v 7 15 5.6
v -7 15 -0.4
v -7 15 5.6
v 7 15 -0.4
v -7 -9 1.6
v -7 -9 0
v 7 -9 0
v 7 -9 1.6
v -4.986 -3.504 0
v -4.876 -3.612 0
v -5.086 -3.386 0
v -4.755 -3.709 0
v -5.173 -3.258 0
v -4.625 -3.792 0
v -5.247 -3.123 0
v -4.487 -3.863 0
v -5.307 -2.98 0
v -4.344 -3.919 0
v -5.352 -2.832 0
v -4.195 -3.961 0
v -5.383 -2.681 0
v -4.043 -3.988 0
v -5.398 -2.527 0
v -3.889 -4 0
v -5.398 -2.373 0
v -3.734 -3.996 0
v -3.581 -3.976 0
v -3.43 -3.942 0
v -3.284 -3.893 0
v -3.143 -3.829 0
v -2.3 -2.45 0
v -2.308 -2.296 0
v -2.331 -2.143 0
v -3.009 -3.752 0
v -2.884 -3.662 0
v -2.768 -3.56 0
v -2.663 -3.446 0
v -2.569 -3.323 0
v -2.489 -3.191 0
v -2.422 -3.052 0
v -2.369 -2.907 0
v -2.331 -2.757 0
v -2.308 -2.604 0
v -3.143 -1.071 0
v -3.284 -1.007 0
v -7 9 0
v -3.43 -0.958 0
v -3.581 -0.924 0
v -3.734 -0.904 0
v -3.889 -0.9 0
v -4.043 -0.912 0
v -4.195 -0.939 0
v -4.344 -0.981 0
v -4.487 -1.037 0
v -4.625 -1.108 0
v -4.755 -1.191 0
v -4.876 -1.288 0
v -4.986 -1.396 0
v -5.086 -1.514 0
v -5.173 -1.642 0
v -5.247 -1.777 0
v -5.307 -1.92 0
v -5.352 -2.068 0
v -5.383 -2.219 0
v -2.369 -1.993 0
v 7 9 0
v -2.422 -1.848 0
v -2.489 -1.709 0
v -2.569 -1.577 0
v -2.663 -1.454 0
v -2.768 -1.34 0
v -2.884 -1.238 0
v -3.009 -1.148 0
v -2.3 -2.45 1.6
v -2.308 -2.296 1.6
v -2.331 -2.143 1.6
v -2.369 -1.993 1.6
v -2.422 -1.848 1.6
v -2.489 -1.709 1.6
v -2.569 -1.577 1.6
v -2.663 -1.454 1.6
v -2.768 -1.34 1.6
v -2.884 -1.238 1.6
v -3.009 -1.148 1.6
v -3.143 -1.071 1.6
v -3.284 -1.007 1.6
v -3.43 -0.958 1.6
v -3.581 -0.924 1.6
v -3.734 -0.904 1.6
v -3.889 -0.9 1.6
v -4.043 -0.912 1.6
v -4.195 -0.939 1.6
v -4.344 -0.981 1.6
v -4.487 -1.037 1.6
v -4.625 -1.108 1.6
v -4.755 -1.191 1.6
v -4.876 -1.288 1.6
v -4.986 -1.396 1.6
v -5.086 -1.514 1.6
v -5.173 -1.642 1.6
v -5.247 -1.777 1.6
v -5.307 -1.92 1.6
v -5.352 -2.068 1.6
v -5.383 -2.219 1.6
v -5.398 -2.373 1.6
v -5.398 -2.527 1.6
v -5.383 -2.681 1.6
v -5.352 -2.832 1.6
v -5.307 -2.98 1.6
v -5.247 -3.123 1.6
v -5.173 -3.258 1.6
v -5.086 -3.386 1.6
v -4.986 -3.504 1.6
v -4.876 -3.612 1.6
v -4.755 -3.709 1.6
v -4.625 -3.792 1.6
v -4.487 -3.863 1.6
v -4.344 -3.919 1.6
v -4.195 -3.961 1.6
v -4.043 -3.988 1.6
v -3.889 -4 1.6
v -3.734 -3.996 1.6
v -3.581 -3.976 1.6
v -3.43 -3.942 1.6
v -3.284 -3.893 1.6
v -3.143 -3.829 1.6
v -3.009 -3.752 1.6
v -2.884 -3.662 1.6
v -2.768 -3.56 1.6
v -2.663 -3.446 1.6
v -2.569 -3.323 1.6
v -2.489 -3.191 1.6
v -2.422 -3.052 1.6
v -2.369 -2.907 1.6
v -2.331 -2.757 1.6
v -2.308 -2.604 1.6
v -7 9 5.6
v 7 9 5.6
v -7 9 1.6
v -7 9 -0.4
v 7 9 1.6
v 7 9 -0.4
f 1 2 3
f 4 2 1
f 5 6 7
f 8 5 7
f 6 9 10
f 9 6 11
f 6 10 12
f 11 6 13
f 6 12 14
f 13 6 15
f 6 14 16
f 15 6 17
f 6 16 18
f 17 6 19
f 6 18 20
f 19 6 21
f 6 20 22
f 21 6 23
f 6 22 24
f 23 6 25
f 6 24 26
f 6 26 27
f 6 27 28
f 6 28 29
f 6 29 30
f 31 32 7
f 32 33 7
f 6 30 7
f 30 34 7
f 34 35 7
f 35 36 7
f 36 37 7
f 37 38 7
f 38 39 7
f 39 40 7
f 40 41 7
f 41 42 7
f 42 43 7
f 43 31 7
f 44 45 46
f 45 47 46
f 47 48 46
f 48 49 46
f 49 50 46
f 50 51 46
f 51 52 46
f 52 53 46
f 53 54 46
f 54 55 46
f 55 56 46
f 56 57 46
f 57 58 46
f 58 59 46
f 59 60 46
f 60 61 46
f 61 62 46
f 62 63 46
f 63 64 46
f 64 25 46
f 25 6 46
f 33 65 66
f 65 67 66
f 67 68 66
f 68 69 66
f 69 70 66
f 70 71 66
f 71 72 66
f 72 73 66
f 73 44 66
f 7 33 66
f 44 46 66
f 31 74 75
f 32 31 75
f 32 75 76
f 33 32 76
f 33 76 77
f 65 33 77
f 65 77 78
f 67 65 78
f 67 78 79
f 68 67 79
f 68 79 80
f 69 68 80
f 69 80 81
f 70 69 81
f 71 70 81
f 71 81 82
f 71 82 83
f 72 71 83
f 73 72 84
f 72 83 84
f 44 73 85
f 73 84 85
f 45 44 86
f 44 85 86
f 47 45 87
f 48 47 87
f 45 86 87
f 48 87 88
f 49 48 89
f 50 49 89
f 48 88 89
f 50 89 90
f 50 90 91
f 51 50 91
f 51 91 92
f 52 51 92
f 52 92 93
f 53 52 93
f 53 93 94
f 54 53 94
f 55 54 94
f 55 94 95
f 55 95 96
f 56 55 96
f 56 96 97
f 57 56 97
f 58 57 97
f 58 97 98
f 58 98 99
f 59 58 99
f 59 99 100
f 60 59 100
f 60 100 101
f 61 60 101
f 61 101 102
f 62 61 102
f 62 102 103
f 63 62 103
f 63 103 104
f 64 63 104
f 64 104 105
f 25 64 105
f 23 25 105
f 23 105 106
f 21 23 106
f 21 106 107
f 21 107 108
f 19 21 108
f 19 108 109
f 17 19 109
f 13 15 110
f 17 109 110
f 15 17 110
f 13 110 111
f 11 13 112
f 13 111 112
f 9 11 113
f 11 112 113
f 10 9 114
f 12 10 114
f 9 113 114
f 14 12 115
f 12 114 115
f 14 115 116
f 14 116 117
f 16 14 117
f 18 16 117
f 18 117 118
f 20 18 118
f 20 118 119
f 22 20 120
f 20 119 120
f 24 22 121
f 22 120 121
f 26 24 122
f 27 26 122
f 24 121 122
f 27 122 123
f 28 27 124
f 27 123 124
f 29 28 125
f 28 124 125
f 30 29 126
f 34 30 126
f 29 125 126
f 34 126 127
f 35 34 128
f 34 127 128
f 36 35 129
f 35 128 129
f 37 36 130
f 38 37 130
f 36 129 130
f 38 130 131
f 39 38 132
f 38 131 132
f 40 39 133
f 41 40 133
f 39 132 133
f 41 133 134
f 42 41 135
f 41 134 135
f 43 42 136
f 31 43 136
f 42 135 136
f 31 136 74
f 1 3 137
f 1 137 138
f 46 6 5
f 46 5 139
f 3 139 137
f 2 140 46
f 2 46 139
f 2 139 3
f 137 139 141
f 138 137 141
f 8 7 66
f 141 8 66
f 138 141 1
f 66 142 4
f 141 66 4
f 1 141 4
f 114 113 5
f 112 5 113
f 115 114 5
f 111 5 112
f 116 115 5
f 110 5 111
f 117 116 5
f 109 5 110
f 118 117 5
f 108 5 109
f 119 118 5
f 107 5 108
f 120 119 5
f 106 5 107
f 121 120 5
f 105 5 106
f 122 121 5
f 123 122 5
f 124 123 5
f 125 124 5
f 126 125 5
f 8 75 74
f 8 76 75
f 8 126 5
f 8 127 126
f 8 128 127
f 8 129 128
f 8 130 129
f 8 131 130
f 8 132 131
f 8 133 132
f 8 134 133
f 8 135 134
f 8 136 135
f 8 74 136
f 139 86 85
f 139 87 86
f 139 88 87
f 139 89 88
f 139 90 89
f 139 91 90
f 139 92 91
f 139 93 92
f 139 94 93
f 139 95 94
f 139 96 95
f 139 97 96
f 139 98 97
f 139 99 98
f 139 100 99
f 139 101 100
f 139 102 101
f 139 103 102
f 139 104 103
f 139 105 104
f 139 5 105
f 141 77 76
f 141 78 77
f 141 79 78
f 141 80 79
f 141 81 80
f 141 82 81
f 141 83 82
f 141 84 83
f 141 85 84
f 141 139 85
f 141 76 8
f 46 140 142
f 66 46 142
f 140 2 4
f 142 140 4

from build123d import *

# Parameters (mm, degrees)
SKETCH1_W           = 14
SKETCH1_H           = 18
BOSS_EXTRUDE1_DEPTH = 1.6
BOSS_EXTRUDE2_START = -2
SKETCH2_W           = 14
SKETCH2_H           = 6
BOSS_EXTRUDE2_DEPTH = 6
SKETCH3_R           = 1.55
CUT_EXTRUDE1_DEPTH  = 18.029386366


with BuildPart() as part:
    # Sketch1 → Boss-Extrude1 (new body)
    with BuildSketch(Plane.XY):
        Rectangle(SKETCH1_W, SKETCH1_H)
    extrude(amount=BOSS_EXTRUDE1_DEPTH)

    # Sketch2 → Boss-Extrude2 (add)
    with BuildSketch(Plane.XY.offset(1.6).offset(BOSS_EXTRUDE2_START)):
        with Locations((0, 12)):
            Rectangle(SKETCH2_W, SKETCH2_H)
    extrude(amount=BOSS_EXTRUDE2_DEPTH)

    # Sketch3 → Cut-Extrude1 (cut, through all)
    with BuildSketch(Plane.XY.offset(1.6)):
        with Locations((-3.85, -2.45)):
            Circle(SKETCH3_R)
    extrude(amount=-CUT_EXTRUDE1_DEPTH, mode=Mode.SUBTRACT)


solid = part.part
